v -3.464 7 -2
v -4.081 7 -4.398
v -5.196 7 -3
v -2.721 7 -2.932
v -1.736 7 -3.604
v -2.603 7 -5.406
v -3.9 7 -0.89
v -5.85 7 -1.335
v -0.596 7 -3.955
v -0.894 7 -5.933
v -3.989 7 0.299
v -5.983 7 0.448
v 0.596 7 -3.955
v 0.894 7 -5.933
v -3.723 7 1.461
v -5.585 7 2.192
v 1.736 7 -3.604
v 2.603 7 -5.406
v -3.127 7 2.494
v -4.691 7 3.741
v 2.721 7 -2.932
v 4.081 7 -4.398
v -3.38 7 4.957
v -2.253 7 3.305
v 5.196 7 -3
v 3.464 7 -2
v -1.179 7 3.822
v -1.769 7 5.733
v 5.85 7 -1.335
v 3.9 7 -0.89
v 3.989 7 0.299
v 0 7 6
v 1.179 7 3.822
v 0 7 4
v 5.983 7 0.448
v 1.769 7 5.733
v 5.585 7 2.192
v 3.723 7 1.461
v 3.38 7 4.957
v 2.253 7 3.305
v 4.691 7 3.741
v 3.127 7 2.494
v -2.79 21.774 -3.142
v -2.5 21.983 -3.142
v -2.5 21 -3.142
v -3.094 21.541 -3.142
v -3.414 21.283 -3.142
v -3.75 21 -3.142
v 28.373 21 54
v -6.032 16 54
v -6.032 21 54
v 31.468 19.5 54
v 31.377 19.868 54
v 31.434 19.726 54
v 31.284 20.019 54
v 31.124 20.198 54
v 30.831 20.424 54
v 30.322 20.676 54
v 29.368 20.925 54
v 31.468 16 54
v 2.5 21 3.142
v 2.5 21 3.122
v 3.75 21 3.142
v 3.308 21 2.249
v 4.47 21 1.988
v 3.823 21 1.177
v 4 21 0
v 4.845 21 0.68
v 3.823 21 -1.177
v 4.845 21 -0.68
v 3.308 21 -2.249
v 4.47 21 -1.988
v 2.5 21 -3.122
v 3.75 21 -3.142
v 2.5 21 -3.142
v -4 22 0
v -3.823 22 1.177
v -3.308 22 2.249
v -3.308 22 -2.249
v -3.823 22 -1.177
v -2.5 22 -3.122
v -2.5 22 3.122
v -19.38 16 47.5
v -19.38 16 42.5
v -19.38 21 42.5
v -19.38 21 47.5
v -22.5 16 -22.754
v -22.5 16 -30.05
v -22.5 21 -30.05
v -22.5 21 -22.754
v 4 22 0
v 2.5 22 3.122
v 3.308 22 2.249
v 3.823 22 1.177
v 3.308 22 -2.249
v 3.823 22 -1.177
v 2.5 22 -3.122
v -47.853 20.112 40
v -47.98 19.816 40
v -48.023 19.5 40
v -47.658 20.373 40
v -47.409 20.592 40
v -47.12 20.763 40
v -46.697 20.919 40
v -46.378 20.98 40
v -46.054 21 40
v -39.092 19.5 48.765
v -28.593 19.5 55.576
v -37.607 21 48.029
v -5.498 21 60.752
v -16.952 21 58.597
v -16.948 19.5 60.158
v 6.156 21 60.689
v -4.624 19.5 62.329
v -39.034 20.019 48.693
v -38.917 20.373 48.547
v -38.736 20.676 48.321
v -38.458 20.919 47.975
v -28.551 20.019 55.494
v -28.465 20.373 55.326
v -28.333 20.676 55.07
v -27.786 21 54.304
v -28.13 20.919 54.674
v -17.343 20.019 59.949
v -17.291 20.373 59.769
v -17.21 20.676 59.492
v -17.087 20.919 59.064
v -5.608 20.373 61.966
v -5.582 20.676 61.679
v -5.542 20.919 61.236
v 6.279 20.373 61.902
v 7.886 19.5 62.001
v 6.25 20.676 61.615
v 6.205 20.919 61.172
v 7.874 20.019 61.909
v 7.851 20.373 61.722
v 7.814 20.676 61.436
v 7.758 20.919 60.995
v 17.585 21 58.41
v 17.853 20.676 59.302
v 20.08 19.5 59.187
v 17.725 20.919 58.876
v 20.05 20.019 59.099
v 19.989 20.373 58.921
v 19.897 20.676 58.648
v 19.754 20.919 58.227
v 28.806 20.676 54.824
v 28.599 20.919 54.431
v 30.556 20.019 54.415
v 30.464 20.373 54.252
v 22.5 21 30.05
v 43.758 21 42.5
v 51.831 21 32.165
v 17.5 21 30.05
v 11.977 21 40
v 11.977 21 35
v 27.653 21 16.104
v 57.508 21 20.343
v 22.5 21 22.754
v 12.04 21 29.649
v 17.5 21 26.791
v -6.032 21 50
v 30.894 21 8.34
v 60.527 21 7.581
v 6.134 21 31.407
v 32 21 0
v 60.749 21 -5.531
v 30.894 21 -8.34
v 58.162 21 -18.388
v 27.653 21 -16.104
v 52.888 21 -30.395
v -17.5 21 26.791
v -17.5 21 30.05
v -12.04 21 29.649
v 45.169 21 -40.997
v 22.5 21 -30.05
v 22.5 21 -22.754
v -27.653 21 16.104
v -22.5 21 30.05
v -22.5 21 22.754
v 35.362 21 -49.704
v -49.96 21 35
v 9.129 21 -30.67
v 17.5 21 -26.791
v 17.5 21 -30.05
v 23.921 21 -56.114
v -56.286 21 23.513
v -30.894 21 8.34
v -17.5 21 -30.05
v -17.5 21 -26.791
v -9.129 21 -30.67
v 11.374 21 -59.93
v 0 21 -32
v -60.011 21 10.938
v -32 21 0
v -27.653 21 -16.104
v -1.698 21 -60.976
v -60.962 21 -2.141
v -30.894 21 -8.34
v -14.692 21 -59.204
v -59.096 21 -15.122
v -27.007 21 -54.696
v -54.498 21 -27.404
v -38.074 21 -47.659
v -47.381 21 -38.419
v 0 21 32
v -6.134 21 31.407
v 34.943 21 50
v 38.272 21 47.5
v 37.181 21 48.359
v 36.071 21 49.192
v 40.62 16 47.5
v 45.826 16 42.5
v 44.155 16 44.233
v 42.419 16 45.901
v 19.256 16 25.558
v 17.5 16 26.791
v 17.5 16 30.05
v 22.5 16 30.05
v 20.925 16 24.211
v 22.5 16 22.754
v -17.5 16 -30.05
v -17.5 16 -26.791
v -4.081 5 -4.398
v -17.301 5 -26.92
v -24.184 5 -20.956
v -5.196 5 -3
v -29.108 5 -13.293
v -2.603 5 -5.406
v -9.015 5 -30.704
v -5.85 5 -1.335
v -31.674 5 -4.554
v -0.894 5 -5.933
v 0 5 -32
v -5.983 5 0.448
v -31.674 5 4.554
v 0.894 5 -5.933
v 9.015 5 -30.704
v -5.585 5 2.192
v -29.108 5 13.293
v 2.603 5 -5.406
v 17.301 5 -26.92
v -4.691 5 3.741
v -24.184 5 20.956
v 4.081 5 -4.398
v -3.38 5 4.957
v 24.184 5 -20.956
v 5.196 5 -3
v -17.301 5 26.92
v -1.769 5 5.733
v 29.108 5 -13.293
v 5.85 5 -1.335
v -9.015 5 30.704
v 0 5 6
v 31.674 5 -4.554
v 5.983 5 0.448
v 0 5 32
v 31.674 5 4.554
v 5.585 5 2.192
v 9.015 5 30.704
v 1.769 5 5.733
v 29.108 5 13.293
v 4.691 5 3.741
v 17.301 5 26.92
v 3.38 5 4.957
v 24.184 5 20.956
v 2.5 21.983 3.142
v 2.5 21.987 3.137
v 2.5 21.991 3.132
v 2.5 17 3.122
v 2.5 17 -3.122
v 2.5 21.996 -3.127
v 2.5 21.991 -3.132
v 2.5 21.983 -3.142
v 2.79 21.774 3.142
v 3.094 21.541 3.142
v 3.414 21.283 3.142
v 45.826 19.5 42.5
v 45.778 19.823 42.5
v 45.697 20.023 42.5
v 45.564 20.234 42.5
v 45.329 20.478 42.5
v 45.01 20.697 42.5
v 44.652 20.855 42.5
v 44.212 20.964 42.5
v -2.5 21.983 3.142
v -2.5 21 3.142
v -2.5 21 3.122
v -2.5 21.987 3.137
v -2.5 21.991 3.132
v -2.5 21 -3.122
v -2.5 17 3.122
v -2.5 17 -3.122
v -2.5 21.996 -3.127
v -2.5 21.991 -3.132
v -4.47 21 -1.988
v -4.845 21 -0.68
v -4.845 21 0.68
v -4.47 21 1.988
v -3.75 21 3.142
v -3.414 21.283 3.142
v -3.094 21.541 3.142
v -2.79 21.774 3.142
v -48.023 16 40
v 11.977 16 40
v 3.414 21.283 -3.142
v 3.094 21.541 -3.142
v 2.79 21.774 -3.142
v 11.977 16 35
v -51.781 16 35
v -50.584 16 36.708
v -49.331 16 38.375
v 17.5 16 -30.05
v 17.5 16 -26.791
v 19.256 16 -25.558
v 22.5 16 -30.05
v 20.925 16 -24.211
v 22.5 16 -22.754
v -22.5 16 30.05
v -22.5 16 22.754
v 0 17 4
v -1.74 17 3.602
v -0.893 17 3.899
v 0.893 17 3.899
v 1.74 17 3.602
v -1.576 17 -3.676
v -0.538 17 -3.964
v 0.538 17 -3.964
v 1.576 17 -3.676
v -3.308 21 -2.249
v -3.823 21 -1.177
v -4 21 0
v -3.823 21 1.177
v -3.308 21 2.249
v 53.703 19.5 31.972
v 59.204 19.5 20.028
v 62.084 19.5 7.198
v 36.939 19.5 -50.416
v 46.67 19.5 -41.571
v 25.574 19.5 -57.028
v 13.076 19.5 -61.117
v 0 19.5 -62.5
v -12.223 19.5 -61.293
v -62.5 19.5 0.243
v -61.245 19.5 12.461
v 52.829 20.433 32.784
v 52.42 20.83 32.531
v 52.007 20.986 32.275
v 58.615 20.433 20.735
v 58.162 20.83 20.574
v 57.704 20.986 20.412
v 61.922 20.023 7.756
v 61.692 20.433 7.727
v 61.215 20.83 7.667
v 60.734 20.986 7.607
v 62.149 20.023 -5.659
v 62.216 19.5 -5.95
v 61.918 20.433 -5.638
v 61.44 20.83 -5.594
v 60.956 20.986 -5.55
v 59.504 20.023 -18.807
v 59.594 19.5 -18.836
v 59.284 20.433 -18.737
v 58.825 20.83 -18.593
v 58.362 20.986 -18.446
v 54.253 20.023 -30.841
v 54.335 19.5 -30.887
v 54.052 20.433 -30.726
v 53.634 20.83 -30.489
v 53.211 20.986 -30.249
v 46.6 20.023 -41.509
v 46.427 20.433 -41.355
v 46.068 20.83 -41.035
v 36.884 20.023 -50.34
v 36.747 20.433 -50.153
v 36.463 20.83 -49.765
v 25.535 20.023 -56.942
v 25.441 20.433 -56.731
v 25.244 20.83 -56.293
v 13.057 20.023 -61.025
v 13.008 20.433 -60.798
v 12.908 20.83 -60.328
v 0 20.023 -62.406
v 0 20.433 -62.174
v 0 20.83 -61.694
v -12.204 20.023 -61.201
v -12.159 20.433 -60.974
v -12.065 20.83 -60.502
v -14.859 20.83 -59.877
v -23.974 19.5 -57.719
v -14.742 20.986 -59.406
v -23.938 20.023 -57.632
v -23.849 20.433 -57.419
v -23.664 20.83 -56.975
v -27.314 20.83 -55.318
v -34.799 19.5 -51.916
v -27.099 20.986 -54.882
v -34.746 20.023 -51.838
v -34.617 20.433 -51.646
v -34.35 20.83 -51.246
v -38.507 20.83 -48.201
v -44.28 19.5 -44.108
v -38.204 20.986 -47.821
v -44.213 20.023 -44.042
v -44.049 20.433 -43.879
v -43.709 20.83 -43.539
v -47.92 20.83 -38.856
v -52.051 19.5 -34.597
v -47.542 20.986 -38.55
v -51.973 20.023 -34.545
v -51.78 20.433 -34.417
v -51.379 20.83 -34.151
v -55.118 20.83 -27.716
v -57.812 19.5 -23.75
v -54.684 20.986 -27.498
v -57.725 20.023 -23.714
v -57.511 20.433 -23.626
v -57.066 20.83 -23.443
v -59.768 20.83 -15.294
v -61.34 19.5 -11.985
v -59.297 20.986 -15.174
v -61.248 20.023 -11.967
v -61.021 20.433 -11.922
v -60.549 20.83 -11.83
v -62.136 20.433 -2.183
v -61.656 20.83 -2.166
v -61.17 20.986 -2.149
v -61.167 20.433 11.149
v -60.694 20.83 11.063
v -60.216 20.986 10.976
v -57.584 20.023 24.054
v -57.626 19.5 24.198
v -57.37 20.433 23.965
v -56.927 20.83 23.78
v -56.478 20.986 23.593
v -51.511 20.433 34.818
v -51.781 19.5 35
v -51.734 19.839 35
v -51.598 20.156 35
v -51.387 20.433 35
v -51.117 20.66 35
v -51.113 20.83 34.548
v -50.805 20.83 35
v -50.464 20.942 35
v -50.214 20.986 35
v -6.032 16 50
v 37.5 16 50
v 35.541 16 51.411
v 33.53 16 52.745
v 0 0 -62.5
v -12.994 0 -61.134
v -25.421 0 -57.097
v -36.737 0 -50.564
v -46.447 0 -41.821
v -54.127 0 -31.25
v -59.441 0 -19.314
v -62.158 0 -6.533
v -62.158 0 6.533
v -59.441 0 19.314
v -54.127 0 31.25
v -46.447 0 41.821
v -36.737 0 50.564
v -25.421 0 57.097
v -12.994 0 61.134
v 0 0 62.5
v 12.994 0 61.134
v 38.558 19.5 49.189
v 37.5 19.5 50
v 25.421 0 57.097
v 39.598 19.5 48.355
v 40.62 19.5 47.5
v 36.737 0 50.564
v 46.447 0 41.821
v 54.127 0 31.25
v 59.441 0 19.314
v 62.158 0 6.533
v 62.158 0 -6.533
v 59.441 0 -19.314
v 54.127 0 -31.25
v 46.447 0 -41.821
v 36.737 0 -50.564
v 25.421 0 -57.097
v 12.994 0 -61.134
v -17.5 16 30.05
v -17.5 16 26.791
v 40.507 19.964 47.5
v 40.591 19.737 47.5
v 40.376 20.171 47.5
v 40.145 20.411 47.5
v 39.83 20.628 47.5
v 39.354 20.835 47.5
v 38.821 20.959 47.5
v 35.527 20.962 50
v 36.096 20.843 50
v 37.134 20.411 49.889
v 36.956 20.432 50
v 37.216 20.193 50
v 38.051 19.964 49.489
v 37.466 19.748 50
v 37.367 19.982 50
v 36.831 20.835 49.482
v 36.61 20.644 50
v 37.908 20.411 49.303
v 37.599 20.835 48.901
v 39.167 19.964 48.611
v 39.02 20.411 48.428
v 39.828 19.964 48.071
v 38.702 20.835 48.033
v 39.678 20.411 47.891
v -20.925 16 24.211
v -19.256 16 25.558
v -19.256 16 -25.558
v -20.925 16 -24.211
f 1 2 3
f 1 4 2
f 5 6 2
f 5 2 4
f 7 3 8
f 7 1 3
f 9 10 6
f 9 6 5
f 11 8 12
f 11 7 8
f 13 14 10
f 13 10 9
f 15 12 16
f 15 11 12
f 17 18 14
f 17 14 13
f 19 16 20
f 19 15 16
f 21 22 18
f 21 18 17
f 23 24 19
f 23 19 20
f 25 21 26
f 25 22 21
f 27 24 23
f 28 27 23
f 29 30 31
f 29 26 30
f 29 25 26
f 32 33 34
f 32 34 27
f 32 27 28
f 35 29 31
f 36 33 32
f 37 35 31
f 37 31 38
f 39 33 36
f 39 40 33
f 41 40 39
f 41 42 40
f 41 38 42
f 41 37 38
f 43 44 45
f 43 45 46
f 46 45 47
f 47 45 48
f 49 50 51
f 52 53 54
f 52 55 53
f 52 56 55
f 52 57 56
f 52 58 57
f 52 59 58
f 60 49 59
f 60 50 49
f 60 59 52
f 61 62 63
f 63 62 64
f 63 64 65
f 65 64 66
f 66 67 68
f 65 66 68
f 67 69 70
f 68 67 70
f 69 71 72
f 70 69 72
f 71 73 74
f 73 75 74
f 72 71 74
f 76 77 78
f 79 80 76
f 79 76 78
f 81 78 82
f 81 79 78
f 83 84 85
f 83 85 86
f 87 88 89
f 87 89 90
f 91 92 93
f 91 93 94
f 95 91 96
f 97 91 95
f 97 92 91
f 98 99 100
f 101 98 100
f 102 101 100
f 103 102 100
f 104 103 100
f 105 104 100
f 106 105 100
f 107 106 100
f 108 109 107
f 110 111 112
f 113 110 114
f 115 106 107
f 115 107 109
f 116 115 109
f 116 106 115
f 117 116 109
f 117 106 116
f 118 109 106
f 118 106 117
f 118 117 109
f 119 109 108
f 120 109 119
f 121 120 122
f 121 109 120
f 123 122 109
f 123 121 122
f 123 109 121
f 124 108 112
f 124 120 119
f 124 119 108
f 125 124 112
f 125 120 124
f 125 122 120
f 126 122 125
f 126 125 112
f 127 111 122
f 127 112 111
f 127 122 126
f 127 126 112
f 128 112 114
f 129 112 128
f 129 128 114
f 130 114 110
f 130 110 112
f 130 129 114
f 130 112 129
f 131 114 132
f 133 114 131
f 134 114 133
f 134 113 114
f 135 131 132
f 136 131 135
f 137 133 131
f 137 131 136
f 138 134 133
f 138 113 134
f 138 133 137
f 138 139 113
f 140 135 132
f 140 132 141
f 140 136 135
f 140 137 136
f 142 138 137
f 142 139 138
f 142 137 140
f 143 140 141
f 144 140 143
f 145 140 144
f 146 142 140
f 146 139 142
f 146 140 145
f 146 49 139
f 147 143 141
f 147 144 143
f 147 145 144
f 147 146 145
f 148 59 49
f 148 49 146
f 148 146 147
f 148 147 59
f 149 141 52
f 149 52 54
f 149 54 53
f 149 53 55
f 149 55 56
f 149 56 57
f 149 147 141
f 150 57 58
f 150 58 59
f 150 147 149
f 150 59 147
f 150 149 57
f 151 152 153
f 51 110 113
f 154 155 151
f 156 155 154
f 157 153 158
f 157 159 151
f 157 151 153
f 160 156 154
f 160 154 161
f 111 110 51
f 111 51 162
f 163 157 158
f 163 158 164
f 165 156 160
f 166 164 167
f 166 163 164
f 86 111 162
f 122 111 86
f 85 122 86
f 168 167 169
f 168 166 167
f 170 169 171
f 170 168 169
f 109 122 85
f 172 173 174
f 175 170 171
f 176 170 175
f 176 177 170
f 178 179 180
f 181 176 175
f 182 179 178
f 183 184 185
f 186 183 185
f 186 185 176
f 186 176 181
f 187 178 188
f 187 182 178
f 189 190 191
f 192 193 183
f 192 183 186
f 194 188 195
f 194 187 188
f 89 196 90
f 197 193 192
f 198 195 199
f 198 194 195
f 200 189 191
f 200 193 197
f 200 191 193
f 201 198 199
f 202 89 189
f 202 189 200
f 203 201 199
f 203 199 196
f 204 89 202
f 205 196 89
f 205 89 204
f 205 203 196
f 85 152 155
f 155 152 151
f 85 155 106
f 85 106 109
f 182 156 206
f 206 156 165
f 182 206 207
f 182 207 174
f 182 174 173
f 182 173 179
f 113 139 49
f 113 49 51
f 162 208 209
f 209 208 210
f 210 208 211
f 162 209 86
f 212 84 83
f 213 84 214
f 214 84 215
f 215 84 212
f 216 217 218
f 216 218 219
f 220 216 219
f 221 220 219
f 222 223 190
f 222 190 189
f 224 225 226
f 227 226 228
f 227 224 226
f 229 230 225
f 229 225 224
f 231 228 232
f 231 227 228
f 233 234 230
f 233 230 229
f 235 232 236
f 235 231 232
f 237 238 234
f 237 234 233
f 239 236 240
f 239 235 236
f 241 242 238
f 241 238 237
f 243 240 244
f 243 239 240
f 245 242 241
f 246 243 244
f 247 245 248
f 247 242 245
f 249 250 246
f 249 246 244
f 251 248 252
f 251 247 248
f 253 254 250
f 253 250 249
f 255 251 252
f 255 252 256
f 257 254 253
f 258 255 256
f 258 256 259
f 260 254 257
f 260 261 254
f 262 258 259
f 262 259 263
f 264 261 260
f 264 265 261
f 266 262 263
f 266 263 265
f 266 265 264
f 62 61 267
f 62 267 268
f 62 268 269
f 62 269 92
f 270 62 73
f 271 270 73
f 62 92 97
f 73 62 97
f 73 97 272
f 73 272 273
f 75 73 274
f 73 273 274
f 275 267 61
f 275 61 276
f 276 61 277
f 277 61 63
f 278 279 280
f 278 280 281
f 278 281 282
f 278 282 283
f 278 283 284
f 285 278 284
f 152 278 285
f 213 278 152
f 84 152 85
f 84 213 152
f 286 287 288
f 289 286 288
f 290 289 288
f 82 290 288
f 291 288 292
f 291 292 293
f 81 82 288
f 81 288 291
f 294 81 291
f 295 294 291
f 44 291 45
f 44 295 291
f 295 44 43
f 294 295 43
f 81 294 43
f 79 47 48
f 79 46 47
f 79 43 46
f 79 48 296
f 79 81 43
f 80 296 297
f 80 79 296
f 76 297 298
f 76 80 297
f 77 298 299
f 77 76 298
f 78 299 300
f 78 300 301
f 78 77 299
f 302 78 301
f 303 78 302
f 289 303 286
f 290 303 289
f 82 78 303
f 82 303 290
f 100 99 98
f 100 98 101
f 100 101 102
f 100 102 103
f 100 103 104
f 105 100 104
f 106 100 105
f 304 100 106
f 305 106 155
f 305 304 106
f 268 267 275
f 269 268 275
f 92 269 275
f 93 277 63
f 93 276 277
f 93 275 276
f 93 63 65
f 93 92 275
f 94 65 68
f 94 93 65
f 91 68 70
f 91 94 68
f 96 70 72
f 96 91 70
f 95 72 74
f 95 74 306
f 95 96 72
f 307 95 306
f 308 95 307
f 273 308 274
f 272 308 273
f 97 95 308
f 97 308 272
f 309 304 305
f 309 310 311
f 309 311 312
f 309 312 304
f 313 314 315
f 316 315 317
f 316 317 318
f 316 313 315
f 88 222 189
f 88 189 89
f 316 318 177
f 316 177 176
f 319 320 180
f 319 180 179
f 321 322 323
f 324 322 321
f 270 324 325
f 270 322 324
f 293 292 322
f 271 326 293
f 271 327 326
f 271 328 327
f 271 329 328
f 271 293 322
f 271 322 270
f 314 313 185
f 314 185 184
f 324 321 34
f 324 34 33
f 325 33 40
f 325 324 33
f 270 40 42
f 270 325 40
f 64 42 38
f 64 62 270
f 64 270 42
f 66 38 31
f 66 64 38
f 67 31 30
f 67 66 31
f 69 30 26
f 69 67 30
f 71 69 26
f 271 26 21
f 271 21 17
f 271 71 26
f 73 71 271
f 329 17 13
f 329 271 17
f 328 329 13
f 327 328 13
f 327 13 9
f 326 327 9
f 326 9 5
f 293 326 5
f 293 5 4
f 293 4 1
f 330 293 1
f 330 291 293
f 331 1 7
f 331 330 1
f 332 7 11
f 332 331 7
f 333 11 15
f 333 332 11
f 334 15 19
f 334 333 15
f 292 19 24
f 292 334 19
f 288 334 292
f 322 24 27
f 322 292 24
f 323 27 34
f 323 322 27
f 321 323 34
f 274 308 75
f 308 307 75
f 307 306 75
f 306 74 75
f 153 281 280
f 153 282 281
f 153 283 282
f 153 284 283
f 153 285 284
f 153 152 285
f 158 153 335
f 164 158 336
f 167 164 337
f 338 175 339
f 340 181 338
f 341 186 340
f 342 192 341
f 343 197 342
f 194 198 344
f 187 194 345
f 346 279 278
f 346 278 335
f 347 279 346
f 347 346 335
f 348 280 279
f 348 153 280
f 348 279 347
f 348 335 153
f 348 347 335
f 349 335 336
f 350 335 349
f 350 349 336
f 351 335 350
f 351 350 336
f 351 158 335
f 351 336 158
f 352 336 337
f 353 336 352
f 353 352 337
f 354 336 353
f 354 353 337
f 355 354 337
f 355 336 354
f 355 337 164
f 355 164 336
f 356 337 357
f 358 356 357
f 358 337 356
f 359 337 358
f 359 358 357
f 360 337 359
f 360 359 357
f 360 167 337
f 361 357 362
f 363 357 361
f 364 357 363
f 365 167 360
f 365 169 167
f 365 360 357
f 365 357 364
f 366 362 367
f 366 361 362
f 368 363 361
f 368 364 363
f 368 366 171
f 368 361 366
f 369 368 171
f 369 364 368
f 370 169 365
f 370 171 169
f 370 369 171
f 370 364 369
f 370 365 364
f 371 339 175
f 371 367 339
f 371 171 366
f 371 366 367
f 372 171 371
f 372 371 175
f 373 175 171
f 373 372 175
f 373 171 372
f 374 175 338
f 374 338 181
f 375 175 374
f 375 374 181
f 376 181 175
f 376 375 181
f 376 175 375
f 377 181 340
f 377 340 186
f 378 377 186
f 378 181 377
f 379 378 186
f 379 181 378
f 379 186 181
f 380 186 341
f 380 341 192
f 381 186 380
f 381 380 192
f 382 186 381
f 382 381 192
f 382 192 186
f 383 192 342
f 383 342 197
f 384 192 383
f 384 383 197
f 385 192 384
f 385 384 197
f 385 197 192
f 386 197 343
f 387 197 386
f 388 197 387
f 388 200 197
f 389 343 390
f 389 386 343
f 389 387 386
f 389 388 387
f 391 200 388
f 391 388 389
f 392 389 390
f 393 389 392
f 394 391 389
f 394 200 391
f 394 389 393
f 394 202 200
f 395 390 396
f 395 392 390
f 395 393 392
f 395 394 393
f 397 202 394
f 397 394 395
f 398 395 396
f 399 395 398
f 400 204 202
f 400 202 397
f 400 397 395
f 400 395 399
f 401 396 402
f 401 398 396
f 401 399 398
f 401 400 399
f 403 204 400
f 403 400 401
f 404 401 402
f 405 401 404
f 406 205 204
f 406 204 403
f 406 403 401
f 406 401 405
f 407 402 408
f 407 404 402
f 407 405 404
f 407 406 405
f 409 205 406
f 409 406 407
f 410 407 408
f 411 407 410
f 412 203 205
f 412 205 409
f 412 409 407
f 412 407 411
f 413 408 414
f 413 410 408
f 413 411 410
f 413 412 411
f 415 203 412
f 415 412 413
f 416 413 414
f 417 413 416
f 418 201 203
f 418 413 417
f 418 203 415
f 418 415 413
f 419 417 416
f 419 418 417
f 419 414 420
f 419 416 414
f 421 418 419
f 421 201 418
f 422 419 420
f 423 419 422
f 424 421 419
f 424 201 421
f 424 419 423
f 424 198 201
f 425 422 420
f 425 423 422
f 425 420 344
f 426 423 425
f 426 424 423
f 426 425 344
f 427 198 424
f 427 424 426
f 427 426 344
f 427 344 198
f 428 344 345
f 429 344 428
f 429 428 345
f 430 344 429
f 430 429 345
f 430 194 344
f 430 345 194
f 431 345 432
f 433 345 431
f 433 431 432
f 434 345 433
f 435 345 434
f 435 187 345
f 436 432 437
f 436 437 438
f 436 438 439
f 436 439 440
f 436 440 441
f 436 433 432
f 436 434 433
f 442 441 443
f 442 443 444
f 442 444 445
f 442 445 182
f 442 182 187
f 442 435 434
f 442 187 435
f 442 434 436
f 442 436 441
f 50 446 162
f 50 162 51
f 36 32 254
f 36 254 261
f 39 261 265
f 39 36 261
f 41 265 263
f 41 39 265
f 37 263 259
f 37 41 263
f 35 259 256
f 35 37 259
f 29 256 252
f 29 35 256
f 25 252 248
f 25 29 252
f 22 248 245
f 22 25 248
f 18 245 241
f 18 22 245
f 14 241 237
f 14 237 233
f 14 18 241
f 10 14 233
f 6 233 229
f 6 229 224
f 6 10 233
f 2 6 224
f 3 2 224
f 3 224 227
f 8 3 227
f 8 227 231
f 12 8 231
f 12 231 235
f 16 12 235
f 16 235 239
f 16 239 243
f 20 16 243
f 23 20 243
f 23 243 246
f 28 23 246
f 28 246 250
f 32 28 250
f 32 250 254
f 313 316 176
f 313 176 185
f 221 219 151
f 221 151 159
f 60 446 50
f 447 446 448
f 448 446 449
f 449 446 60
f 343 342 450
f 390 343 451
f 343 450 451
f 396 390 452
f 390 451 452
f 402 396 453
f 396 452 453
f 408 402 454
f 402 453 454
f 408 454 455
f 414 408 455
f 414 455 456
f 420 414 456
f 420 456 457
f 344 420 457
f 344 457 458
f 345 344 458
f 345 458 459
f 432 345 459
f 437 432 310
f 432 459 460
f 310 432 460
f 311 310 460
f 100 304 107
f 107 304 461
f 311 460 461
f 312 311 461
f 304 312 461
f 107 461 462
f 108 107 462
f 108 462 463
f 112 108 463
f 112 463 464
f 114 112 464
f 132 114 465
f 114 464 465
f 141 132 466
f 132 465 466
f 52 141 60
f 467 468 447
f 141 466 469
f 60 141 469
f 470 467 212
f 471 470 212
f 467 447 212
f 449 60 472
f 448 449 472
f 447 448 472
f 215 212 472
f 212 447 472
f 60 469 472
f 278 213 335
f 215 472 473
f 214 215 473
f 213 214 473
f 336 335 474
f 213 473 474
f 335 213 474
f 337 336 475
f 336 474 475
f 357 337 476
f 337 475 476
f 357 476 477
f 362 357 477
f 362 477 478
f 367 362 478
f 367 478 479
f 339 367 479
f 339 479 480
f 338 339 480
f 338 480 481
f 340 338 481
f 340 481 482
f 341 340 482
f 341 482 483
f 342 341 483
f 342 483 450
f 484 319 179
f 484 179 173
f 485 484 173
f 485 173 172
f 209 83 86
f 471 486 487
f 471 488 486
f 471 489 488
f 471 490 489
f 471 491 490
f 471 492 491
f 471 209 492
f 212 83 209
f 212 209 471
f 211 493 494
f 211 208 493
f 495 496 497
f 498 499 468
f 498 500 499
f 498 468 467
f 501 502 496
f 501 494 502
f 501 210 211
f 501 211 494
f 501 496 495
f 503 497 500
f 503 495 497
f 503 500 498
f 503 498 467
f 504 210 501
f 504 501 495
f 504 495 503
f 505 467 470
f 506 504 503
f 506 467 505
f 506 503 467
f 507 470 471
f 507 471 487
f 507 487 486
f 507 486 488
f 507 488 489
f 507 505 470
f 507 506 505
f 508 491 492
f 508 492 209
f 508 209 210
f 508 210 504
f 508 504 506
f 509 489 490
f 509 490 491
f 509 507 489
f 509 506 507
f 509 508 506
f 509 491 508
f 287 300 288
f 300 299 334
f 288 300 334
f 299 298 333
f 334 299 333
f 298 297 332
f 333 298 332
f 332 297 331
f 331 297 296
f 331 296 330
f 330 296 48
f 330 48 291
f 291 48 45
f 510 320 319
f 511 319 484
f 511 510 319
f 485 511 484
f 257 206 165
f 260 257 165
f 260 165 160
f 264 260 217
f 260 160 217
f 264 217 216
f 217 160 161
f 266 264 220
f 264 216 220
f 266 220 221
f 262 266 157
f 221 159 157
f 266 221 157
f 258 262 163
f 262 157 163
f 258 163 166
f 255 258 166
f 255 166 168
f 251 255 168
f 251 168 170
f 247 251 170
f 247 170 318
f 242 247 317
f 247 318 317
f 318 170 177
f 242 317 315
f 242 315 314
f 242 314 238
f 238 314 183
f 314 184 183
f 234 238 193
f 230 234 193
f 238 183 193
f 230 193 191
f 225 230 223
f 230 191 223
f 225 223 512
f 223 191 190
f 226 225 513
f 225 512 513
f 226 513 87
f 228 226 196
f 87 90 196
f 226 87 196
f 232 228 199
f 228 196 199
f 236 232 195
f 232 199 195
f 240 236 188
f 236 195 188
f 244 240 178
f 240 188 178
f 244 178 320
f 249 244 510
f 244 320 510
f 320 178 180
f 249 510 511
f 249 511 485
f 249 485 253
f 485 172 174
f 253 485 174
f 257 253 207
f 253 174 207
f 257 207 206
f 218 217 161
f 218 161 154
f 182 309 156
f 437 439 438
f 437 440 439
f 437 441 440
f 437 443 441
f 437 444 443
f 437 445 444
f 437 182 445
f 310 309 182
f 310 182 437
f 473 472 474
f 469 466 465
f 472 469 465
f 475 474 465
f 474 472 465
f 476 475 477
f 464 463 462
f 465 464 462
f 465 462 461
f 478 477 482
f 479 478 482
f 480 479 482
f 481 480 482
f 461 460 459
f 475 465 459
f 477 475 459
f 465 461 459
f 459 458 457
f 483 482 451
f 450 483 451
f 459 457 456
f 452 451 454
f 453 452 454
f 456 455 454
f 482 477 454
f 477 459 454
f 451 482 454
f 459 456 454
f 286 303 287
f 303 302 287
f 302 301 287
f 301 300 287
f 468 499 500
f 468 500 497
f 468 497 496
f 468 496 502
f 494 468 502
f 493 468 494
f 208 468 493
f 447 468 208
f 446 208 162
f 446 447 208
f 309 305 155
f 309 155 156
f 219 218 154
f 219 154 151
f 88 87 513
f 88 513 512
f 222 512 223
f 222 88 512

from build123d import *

# Parameters (mm, degrees)
SKETCH1_R           = 62.5
BOSS_EXTRUDE1_DEPTH = 21
SKETCH2_R           = 32
SKETCH2_R_2         = 6
CUT_EXTRUDE1_DEPTH  = 16
SKETCH3_R           = 6
SKETCH3_R_2         = 4
CUT_EXTRUDE2_DEPTH  = 14
CUT_EXTRUDE7_START  = -5
CUT_EXTRUDE7_DEPTH  = 5
FILLET1_R           = 1.5
BOSS_EXTRUDE2_START = 1
SKETCH12_R          = 4
BOSS_EXTRUDE2_DEPTH = 1
BOSS_EXTRUDE3_DEPTH = 1
SKETCH14_W          = 5
SKETCH14_H          = 8
CUT_EXTRUDE9_DEPTH  = 5


# Read off the part's stored shape, not the designer's step: Cut-Extrude7
with BuildPart() as part:
    # Sketch1 → Boss-Extrude1 (new body)
    with BuildSketch(Plane(origin=(0, 0, 0), x_dir=(1, 0, 0), z_dir=(0, 1, 0))):
        with Locations(Location((0, 0, 0), (0, 0, 90))):
            Circle(SKETCH1_R)
    extrude(amount=BOSS_EXTRUDE1_DEPTH)

    # Sketch2 → Cut-Extrude1 (cut)
    with BuildSketch(Plane(origin=(0, 21, 0), x_dir=(1, 0, 0), z_dir=(0, 1, 0))):
        with Locations(Location((0, 0, 0), (0, 0, 270))):
            Circle(SKETCH2_R)
        with Locations(Location((0, 0, 0), (0, 0, 270))):
            Circle(SKETCH2_R_2, mode=Mode.SUBTRACT)
    extrude(amount=-CUT_EXTRUDE1_DEPTH, mode=Mode.SUBTRACT)

    # Sketch3 → Cut-Extrude2 (cut)
    with BuildSketch(Plane(origin=(0, 21, 0), x_dir=(1, 0, 0), z_dir=(0, 1, 0))):
        with Locations(Location((0, 0, 0), (0, 0, 270))):
            Circle(SKETCH3_R)
        with Locations(Location((0, 0, 0), (0, 0, 270))):
            Circle(SKETCH3_R_2, mode=Mode.SUBTRACT)
    extrude(amount=-CUT_EXTRUDE2_DEPTH, mode=Mode.SUBTRACT)

    # Cut-Extrude7 outline → Cut-Extrude7 (cut)
    with BuildSketch(Plane(origin=(0, 21, 0), x_dir=(1, 0, 0), z_dir=(0, 1, 0)).offset(CUT_EXTRUDE7_START)):
        with BuildLine():
            Line((-48.023431781, -40), (11.976568219, -40))
            Line((11.976568219, -40), (11.976568219, -35))
            Line((11.976568219, -35), (-51.780787943, -35))
            ThreePointArc((-51.780787943, -35), (-49.964693221, -37.547029594), (-48.023431781, -40))
        make_face()
        with BuildLine():
            Line((-6.031762045, -54), (31.468237955, -54))
            ThreePointArc((31.468237955, -54), (34.542067999, -52.087383677), (37.5, -50))
            Line((37.5, -50), (-6.031762045, -50))
            Line((-6.031762045, -50), (-6.031762045, -54))
        make_face()
        with BuildLine():
            ThreePointArc((40.620192023, -47.5), (43.295213632, -45.075209113), (45.82575695, -42.5))
            Line((45.82575695, -42.5), (-19.379807977, -42.5))
            Line((-19.379807977, -42.5), (-19.379807977, -47.5))
            Line((-19.379807977, -47.5), (40.620192023, -47.5))
        make_face()
        with BuildLine():
            ThreePointArc((-17.5, -26.790856649), (-20.101587243, -24.898317018), (-22.5, -22.754120506))
            Line((-22.5, -22.754120506), (-22.5, -30.05))
            Line((-22.5, -30.05), (-17.5, -30.05))
            Line((-17.5, -30.05), (-17.5, -26.790856649))
        make_face()
        with BuildLine():
            Line((-22.5, 30.05), (-22.5, 22.754120506))
            ThreePointArc((-22.5, 22.754120506), (-20.101587243, 24.898317018), (-17.5, 26.790856649))
            Line((-17.5, 26.790856649), (-17.5, 30.05))
            Line((-17.5, 30.05), (-22.5, 30.05))
        make_face()
        with BuildLine():
            ThreePointArc((22.5, -22.754120506), (20.101587243, -24.898317018), (17.5, -26.790856649))
            Line((17.5, -26.790856649), (17.5, -30.05))
            Line((17.5, -30.05), (22.5, -30.05))
            Line((22.5, -30.05), (22.5, -22.754120506))
        make_face()
        with BuildLine():
            Line((17.5, 30.05), (17.5, 26.790856649))
            ThreePointArc((17.5, 26.790856649), (20.101587243, 24.898317018), (22.5, 22.754120506))
            Line((22.5, 22.754120506), (22.5, 30.05))
            Line((22.5, 30.05), (17.5, 30.05))
        make_face()
    extrude(amount=CUT_EXTRUDE7_DEPTH, mode=Mode.SUBTRACT)

    # Fillet1
    fillet1_edges = [part.edges().sort_by_distance(p)[0] for p in [
        (-10.840600106, 21, 61.552671667),
        (39.080092124, 21, 48.774956684),
        (57.282196187, 21, -25),
    ]]
    fillet(fillet1_edges, radius=FILLET1_R)

    # Sketch12 → Boss-Extrude2 (add)
    with BuildSketch(Plane(origin=(0, 21, 0), x_dir=(1, 0, 0), z_dir=(0, 1, 0)).offset(BOSS_EXTRUDE2_START)):
        with Locations(Location((0, 0, 0), (0, 0, 270))):
            Circle(SKETCH12_R)
    extrude(amount=-BOSS_EXTRUDE2_DEPTH)

    # Sketch13 → Boss-Extrude3 (add)
    with BuildSketch(Plane(origin=(0, 21, 0), x_dir=(1, 0, 0), z_dir=(0, 1, 0))):
        with BuildLine():
            Line((-3.75, -3.142053469), (3.75, -3.142053469))
            ThreePointArc((3.75, -3.142053469), (4.892340953, 0), (3.75, 3.142053469))
            Line((3.75, 3.142053469), (-3.75, 3.142053469))
            ThreePointArc((-3.75, 3.142053469), (-4.892340953, 0), (-3.75, -3.142053469))
        make_face()
    extrude(amount=BOSS_EXTRUDE3_DEPTH)

    # Sketch14 → Cut-Extrude9 (cut)
    with BuildSketch(Plane(origin=(0, 22, 0), x_dir=(1, 0, 0), z_dir=(0, 1, 0))):
        Rectangle(SKETCH14_W, SKETCH14_H)
    extrude(amount=-CUT_EXTRUDE9_DEPTH, mode=Mode.SUBTRACT)

    # Sketch16 → Cut-Revolve1 (revolve, cut)
    with BuildSketch(Plane.XY, mode=Mode.PRIVATE) as cut_revolve1_sk:
        Polygon((4.892340953, 21), (4, 22), (4.892340953, 22), align=None)
    revolve(cut_revolve1_sk.sketch.rotate(Axis((0, 0, 0), (0, 1, 0)), 214.055797743), axis=Axis((0, 0, 0), (0, 1, 0)), mode=Mode.SUBTRACT)


solid = part.part
